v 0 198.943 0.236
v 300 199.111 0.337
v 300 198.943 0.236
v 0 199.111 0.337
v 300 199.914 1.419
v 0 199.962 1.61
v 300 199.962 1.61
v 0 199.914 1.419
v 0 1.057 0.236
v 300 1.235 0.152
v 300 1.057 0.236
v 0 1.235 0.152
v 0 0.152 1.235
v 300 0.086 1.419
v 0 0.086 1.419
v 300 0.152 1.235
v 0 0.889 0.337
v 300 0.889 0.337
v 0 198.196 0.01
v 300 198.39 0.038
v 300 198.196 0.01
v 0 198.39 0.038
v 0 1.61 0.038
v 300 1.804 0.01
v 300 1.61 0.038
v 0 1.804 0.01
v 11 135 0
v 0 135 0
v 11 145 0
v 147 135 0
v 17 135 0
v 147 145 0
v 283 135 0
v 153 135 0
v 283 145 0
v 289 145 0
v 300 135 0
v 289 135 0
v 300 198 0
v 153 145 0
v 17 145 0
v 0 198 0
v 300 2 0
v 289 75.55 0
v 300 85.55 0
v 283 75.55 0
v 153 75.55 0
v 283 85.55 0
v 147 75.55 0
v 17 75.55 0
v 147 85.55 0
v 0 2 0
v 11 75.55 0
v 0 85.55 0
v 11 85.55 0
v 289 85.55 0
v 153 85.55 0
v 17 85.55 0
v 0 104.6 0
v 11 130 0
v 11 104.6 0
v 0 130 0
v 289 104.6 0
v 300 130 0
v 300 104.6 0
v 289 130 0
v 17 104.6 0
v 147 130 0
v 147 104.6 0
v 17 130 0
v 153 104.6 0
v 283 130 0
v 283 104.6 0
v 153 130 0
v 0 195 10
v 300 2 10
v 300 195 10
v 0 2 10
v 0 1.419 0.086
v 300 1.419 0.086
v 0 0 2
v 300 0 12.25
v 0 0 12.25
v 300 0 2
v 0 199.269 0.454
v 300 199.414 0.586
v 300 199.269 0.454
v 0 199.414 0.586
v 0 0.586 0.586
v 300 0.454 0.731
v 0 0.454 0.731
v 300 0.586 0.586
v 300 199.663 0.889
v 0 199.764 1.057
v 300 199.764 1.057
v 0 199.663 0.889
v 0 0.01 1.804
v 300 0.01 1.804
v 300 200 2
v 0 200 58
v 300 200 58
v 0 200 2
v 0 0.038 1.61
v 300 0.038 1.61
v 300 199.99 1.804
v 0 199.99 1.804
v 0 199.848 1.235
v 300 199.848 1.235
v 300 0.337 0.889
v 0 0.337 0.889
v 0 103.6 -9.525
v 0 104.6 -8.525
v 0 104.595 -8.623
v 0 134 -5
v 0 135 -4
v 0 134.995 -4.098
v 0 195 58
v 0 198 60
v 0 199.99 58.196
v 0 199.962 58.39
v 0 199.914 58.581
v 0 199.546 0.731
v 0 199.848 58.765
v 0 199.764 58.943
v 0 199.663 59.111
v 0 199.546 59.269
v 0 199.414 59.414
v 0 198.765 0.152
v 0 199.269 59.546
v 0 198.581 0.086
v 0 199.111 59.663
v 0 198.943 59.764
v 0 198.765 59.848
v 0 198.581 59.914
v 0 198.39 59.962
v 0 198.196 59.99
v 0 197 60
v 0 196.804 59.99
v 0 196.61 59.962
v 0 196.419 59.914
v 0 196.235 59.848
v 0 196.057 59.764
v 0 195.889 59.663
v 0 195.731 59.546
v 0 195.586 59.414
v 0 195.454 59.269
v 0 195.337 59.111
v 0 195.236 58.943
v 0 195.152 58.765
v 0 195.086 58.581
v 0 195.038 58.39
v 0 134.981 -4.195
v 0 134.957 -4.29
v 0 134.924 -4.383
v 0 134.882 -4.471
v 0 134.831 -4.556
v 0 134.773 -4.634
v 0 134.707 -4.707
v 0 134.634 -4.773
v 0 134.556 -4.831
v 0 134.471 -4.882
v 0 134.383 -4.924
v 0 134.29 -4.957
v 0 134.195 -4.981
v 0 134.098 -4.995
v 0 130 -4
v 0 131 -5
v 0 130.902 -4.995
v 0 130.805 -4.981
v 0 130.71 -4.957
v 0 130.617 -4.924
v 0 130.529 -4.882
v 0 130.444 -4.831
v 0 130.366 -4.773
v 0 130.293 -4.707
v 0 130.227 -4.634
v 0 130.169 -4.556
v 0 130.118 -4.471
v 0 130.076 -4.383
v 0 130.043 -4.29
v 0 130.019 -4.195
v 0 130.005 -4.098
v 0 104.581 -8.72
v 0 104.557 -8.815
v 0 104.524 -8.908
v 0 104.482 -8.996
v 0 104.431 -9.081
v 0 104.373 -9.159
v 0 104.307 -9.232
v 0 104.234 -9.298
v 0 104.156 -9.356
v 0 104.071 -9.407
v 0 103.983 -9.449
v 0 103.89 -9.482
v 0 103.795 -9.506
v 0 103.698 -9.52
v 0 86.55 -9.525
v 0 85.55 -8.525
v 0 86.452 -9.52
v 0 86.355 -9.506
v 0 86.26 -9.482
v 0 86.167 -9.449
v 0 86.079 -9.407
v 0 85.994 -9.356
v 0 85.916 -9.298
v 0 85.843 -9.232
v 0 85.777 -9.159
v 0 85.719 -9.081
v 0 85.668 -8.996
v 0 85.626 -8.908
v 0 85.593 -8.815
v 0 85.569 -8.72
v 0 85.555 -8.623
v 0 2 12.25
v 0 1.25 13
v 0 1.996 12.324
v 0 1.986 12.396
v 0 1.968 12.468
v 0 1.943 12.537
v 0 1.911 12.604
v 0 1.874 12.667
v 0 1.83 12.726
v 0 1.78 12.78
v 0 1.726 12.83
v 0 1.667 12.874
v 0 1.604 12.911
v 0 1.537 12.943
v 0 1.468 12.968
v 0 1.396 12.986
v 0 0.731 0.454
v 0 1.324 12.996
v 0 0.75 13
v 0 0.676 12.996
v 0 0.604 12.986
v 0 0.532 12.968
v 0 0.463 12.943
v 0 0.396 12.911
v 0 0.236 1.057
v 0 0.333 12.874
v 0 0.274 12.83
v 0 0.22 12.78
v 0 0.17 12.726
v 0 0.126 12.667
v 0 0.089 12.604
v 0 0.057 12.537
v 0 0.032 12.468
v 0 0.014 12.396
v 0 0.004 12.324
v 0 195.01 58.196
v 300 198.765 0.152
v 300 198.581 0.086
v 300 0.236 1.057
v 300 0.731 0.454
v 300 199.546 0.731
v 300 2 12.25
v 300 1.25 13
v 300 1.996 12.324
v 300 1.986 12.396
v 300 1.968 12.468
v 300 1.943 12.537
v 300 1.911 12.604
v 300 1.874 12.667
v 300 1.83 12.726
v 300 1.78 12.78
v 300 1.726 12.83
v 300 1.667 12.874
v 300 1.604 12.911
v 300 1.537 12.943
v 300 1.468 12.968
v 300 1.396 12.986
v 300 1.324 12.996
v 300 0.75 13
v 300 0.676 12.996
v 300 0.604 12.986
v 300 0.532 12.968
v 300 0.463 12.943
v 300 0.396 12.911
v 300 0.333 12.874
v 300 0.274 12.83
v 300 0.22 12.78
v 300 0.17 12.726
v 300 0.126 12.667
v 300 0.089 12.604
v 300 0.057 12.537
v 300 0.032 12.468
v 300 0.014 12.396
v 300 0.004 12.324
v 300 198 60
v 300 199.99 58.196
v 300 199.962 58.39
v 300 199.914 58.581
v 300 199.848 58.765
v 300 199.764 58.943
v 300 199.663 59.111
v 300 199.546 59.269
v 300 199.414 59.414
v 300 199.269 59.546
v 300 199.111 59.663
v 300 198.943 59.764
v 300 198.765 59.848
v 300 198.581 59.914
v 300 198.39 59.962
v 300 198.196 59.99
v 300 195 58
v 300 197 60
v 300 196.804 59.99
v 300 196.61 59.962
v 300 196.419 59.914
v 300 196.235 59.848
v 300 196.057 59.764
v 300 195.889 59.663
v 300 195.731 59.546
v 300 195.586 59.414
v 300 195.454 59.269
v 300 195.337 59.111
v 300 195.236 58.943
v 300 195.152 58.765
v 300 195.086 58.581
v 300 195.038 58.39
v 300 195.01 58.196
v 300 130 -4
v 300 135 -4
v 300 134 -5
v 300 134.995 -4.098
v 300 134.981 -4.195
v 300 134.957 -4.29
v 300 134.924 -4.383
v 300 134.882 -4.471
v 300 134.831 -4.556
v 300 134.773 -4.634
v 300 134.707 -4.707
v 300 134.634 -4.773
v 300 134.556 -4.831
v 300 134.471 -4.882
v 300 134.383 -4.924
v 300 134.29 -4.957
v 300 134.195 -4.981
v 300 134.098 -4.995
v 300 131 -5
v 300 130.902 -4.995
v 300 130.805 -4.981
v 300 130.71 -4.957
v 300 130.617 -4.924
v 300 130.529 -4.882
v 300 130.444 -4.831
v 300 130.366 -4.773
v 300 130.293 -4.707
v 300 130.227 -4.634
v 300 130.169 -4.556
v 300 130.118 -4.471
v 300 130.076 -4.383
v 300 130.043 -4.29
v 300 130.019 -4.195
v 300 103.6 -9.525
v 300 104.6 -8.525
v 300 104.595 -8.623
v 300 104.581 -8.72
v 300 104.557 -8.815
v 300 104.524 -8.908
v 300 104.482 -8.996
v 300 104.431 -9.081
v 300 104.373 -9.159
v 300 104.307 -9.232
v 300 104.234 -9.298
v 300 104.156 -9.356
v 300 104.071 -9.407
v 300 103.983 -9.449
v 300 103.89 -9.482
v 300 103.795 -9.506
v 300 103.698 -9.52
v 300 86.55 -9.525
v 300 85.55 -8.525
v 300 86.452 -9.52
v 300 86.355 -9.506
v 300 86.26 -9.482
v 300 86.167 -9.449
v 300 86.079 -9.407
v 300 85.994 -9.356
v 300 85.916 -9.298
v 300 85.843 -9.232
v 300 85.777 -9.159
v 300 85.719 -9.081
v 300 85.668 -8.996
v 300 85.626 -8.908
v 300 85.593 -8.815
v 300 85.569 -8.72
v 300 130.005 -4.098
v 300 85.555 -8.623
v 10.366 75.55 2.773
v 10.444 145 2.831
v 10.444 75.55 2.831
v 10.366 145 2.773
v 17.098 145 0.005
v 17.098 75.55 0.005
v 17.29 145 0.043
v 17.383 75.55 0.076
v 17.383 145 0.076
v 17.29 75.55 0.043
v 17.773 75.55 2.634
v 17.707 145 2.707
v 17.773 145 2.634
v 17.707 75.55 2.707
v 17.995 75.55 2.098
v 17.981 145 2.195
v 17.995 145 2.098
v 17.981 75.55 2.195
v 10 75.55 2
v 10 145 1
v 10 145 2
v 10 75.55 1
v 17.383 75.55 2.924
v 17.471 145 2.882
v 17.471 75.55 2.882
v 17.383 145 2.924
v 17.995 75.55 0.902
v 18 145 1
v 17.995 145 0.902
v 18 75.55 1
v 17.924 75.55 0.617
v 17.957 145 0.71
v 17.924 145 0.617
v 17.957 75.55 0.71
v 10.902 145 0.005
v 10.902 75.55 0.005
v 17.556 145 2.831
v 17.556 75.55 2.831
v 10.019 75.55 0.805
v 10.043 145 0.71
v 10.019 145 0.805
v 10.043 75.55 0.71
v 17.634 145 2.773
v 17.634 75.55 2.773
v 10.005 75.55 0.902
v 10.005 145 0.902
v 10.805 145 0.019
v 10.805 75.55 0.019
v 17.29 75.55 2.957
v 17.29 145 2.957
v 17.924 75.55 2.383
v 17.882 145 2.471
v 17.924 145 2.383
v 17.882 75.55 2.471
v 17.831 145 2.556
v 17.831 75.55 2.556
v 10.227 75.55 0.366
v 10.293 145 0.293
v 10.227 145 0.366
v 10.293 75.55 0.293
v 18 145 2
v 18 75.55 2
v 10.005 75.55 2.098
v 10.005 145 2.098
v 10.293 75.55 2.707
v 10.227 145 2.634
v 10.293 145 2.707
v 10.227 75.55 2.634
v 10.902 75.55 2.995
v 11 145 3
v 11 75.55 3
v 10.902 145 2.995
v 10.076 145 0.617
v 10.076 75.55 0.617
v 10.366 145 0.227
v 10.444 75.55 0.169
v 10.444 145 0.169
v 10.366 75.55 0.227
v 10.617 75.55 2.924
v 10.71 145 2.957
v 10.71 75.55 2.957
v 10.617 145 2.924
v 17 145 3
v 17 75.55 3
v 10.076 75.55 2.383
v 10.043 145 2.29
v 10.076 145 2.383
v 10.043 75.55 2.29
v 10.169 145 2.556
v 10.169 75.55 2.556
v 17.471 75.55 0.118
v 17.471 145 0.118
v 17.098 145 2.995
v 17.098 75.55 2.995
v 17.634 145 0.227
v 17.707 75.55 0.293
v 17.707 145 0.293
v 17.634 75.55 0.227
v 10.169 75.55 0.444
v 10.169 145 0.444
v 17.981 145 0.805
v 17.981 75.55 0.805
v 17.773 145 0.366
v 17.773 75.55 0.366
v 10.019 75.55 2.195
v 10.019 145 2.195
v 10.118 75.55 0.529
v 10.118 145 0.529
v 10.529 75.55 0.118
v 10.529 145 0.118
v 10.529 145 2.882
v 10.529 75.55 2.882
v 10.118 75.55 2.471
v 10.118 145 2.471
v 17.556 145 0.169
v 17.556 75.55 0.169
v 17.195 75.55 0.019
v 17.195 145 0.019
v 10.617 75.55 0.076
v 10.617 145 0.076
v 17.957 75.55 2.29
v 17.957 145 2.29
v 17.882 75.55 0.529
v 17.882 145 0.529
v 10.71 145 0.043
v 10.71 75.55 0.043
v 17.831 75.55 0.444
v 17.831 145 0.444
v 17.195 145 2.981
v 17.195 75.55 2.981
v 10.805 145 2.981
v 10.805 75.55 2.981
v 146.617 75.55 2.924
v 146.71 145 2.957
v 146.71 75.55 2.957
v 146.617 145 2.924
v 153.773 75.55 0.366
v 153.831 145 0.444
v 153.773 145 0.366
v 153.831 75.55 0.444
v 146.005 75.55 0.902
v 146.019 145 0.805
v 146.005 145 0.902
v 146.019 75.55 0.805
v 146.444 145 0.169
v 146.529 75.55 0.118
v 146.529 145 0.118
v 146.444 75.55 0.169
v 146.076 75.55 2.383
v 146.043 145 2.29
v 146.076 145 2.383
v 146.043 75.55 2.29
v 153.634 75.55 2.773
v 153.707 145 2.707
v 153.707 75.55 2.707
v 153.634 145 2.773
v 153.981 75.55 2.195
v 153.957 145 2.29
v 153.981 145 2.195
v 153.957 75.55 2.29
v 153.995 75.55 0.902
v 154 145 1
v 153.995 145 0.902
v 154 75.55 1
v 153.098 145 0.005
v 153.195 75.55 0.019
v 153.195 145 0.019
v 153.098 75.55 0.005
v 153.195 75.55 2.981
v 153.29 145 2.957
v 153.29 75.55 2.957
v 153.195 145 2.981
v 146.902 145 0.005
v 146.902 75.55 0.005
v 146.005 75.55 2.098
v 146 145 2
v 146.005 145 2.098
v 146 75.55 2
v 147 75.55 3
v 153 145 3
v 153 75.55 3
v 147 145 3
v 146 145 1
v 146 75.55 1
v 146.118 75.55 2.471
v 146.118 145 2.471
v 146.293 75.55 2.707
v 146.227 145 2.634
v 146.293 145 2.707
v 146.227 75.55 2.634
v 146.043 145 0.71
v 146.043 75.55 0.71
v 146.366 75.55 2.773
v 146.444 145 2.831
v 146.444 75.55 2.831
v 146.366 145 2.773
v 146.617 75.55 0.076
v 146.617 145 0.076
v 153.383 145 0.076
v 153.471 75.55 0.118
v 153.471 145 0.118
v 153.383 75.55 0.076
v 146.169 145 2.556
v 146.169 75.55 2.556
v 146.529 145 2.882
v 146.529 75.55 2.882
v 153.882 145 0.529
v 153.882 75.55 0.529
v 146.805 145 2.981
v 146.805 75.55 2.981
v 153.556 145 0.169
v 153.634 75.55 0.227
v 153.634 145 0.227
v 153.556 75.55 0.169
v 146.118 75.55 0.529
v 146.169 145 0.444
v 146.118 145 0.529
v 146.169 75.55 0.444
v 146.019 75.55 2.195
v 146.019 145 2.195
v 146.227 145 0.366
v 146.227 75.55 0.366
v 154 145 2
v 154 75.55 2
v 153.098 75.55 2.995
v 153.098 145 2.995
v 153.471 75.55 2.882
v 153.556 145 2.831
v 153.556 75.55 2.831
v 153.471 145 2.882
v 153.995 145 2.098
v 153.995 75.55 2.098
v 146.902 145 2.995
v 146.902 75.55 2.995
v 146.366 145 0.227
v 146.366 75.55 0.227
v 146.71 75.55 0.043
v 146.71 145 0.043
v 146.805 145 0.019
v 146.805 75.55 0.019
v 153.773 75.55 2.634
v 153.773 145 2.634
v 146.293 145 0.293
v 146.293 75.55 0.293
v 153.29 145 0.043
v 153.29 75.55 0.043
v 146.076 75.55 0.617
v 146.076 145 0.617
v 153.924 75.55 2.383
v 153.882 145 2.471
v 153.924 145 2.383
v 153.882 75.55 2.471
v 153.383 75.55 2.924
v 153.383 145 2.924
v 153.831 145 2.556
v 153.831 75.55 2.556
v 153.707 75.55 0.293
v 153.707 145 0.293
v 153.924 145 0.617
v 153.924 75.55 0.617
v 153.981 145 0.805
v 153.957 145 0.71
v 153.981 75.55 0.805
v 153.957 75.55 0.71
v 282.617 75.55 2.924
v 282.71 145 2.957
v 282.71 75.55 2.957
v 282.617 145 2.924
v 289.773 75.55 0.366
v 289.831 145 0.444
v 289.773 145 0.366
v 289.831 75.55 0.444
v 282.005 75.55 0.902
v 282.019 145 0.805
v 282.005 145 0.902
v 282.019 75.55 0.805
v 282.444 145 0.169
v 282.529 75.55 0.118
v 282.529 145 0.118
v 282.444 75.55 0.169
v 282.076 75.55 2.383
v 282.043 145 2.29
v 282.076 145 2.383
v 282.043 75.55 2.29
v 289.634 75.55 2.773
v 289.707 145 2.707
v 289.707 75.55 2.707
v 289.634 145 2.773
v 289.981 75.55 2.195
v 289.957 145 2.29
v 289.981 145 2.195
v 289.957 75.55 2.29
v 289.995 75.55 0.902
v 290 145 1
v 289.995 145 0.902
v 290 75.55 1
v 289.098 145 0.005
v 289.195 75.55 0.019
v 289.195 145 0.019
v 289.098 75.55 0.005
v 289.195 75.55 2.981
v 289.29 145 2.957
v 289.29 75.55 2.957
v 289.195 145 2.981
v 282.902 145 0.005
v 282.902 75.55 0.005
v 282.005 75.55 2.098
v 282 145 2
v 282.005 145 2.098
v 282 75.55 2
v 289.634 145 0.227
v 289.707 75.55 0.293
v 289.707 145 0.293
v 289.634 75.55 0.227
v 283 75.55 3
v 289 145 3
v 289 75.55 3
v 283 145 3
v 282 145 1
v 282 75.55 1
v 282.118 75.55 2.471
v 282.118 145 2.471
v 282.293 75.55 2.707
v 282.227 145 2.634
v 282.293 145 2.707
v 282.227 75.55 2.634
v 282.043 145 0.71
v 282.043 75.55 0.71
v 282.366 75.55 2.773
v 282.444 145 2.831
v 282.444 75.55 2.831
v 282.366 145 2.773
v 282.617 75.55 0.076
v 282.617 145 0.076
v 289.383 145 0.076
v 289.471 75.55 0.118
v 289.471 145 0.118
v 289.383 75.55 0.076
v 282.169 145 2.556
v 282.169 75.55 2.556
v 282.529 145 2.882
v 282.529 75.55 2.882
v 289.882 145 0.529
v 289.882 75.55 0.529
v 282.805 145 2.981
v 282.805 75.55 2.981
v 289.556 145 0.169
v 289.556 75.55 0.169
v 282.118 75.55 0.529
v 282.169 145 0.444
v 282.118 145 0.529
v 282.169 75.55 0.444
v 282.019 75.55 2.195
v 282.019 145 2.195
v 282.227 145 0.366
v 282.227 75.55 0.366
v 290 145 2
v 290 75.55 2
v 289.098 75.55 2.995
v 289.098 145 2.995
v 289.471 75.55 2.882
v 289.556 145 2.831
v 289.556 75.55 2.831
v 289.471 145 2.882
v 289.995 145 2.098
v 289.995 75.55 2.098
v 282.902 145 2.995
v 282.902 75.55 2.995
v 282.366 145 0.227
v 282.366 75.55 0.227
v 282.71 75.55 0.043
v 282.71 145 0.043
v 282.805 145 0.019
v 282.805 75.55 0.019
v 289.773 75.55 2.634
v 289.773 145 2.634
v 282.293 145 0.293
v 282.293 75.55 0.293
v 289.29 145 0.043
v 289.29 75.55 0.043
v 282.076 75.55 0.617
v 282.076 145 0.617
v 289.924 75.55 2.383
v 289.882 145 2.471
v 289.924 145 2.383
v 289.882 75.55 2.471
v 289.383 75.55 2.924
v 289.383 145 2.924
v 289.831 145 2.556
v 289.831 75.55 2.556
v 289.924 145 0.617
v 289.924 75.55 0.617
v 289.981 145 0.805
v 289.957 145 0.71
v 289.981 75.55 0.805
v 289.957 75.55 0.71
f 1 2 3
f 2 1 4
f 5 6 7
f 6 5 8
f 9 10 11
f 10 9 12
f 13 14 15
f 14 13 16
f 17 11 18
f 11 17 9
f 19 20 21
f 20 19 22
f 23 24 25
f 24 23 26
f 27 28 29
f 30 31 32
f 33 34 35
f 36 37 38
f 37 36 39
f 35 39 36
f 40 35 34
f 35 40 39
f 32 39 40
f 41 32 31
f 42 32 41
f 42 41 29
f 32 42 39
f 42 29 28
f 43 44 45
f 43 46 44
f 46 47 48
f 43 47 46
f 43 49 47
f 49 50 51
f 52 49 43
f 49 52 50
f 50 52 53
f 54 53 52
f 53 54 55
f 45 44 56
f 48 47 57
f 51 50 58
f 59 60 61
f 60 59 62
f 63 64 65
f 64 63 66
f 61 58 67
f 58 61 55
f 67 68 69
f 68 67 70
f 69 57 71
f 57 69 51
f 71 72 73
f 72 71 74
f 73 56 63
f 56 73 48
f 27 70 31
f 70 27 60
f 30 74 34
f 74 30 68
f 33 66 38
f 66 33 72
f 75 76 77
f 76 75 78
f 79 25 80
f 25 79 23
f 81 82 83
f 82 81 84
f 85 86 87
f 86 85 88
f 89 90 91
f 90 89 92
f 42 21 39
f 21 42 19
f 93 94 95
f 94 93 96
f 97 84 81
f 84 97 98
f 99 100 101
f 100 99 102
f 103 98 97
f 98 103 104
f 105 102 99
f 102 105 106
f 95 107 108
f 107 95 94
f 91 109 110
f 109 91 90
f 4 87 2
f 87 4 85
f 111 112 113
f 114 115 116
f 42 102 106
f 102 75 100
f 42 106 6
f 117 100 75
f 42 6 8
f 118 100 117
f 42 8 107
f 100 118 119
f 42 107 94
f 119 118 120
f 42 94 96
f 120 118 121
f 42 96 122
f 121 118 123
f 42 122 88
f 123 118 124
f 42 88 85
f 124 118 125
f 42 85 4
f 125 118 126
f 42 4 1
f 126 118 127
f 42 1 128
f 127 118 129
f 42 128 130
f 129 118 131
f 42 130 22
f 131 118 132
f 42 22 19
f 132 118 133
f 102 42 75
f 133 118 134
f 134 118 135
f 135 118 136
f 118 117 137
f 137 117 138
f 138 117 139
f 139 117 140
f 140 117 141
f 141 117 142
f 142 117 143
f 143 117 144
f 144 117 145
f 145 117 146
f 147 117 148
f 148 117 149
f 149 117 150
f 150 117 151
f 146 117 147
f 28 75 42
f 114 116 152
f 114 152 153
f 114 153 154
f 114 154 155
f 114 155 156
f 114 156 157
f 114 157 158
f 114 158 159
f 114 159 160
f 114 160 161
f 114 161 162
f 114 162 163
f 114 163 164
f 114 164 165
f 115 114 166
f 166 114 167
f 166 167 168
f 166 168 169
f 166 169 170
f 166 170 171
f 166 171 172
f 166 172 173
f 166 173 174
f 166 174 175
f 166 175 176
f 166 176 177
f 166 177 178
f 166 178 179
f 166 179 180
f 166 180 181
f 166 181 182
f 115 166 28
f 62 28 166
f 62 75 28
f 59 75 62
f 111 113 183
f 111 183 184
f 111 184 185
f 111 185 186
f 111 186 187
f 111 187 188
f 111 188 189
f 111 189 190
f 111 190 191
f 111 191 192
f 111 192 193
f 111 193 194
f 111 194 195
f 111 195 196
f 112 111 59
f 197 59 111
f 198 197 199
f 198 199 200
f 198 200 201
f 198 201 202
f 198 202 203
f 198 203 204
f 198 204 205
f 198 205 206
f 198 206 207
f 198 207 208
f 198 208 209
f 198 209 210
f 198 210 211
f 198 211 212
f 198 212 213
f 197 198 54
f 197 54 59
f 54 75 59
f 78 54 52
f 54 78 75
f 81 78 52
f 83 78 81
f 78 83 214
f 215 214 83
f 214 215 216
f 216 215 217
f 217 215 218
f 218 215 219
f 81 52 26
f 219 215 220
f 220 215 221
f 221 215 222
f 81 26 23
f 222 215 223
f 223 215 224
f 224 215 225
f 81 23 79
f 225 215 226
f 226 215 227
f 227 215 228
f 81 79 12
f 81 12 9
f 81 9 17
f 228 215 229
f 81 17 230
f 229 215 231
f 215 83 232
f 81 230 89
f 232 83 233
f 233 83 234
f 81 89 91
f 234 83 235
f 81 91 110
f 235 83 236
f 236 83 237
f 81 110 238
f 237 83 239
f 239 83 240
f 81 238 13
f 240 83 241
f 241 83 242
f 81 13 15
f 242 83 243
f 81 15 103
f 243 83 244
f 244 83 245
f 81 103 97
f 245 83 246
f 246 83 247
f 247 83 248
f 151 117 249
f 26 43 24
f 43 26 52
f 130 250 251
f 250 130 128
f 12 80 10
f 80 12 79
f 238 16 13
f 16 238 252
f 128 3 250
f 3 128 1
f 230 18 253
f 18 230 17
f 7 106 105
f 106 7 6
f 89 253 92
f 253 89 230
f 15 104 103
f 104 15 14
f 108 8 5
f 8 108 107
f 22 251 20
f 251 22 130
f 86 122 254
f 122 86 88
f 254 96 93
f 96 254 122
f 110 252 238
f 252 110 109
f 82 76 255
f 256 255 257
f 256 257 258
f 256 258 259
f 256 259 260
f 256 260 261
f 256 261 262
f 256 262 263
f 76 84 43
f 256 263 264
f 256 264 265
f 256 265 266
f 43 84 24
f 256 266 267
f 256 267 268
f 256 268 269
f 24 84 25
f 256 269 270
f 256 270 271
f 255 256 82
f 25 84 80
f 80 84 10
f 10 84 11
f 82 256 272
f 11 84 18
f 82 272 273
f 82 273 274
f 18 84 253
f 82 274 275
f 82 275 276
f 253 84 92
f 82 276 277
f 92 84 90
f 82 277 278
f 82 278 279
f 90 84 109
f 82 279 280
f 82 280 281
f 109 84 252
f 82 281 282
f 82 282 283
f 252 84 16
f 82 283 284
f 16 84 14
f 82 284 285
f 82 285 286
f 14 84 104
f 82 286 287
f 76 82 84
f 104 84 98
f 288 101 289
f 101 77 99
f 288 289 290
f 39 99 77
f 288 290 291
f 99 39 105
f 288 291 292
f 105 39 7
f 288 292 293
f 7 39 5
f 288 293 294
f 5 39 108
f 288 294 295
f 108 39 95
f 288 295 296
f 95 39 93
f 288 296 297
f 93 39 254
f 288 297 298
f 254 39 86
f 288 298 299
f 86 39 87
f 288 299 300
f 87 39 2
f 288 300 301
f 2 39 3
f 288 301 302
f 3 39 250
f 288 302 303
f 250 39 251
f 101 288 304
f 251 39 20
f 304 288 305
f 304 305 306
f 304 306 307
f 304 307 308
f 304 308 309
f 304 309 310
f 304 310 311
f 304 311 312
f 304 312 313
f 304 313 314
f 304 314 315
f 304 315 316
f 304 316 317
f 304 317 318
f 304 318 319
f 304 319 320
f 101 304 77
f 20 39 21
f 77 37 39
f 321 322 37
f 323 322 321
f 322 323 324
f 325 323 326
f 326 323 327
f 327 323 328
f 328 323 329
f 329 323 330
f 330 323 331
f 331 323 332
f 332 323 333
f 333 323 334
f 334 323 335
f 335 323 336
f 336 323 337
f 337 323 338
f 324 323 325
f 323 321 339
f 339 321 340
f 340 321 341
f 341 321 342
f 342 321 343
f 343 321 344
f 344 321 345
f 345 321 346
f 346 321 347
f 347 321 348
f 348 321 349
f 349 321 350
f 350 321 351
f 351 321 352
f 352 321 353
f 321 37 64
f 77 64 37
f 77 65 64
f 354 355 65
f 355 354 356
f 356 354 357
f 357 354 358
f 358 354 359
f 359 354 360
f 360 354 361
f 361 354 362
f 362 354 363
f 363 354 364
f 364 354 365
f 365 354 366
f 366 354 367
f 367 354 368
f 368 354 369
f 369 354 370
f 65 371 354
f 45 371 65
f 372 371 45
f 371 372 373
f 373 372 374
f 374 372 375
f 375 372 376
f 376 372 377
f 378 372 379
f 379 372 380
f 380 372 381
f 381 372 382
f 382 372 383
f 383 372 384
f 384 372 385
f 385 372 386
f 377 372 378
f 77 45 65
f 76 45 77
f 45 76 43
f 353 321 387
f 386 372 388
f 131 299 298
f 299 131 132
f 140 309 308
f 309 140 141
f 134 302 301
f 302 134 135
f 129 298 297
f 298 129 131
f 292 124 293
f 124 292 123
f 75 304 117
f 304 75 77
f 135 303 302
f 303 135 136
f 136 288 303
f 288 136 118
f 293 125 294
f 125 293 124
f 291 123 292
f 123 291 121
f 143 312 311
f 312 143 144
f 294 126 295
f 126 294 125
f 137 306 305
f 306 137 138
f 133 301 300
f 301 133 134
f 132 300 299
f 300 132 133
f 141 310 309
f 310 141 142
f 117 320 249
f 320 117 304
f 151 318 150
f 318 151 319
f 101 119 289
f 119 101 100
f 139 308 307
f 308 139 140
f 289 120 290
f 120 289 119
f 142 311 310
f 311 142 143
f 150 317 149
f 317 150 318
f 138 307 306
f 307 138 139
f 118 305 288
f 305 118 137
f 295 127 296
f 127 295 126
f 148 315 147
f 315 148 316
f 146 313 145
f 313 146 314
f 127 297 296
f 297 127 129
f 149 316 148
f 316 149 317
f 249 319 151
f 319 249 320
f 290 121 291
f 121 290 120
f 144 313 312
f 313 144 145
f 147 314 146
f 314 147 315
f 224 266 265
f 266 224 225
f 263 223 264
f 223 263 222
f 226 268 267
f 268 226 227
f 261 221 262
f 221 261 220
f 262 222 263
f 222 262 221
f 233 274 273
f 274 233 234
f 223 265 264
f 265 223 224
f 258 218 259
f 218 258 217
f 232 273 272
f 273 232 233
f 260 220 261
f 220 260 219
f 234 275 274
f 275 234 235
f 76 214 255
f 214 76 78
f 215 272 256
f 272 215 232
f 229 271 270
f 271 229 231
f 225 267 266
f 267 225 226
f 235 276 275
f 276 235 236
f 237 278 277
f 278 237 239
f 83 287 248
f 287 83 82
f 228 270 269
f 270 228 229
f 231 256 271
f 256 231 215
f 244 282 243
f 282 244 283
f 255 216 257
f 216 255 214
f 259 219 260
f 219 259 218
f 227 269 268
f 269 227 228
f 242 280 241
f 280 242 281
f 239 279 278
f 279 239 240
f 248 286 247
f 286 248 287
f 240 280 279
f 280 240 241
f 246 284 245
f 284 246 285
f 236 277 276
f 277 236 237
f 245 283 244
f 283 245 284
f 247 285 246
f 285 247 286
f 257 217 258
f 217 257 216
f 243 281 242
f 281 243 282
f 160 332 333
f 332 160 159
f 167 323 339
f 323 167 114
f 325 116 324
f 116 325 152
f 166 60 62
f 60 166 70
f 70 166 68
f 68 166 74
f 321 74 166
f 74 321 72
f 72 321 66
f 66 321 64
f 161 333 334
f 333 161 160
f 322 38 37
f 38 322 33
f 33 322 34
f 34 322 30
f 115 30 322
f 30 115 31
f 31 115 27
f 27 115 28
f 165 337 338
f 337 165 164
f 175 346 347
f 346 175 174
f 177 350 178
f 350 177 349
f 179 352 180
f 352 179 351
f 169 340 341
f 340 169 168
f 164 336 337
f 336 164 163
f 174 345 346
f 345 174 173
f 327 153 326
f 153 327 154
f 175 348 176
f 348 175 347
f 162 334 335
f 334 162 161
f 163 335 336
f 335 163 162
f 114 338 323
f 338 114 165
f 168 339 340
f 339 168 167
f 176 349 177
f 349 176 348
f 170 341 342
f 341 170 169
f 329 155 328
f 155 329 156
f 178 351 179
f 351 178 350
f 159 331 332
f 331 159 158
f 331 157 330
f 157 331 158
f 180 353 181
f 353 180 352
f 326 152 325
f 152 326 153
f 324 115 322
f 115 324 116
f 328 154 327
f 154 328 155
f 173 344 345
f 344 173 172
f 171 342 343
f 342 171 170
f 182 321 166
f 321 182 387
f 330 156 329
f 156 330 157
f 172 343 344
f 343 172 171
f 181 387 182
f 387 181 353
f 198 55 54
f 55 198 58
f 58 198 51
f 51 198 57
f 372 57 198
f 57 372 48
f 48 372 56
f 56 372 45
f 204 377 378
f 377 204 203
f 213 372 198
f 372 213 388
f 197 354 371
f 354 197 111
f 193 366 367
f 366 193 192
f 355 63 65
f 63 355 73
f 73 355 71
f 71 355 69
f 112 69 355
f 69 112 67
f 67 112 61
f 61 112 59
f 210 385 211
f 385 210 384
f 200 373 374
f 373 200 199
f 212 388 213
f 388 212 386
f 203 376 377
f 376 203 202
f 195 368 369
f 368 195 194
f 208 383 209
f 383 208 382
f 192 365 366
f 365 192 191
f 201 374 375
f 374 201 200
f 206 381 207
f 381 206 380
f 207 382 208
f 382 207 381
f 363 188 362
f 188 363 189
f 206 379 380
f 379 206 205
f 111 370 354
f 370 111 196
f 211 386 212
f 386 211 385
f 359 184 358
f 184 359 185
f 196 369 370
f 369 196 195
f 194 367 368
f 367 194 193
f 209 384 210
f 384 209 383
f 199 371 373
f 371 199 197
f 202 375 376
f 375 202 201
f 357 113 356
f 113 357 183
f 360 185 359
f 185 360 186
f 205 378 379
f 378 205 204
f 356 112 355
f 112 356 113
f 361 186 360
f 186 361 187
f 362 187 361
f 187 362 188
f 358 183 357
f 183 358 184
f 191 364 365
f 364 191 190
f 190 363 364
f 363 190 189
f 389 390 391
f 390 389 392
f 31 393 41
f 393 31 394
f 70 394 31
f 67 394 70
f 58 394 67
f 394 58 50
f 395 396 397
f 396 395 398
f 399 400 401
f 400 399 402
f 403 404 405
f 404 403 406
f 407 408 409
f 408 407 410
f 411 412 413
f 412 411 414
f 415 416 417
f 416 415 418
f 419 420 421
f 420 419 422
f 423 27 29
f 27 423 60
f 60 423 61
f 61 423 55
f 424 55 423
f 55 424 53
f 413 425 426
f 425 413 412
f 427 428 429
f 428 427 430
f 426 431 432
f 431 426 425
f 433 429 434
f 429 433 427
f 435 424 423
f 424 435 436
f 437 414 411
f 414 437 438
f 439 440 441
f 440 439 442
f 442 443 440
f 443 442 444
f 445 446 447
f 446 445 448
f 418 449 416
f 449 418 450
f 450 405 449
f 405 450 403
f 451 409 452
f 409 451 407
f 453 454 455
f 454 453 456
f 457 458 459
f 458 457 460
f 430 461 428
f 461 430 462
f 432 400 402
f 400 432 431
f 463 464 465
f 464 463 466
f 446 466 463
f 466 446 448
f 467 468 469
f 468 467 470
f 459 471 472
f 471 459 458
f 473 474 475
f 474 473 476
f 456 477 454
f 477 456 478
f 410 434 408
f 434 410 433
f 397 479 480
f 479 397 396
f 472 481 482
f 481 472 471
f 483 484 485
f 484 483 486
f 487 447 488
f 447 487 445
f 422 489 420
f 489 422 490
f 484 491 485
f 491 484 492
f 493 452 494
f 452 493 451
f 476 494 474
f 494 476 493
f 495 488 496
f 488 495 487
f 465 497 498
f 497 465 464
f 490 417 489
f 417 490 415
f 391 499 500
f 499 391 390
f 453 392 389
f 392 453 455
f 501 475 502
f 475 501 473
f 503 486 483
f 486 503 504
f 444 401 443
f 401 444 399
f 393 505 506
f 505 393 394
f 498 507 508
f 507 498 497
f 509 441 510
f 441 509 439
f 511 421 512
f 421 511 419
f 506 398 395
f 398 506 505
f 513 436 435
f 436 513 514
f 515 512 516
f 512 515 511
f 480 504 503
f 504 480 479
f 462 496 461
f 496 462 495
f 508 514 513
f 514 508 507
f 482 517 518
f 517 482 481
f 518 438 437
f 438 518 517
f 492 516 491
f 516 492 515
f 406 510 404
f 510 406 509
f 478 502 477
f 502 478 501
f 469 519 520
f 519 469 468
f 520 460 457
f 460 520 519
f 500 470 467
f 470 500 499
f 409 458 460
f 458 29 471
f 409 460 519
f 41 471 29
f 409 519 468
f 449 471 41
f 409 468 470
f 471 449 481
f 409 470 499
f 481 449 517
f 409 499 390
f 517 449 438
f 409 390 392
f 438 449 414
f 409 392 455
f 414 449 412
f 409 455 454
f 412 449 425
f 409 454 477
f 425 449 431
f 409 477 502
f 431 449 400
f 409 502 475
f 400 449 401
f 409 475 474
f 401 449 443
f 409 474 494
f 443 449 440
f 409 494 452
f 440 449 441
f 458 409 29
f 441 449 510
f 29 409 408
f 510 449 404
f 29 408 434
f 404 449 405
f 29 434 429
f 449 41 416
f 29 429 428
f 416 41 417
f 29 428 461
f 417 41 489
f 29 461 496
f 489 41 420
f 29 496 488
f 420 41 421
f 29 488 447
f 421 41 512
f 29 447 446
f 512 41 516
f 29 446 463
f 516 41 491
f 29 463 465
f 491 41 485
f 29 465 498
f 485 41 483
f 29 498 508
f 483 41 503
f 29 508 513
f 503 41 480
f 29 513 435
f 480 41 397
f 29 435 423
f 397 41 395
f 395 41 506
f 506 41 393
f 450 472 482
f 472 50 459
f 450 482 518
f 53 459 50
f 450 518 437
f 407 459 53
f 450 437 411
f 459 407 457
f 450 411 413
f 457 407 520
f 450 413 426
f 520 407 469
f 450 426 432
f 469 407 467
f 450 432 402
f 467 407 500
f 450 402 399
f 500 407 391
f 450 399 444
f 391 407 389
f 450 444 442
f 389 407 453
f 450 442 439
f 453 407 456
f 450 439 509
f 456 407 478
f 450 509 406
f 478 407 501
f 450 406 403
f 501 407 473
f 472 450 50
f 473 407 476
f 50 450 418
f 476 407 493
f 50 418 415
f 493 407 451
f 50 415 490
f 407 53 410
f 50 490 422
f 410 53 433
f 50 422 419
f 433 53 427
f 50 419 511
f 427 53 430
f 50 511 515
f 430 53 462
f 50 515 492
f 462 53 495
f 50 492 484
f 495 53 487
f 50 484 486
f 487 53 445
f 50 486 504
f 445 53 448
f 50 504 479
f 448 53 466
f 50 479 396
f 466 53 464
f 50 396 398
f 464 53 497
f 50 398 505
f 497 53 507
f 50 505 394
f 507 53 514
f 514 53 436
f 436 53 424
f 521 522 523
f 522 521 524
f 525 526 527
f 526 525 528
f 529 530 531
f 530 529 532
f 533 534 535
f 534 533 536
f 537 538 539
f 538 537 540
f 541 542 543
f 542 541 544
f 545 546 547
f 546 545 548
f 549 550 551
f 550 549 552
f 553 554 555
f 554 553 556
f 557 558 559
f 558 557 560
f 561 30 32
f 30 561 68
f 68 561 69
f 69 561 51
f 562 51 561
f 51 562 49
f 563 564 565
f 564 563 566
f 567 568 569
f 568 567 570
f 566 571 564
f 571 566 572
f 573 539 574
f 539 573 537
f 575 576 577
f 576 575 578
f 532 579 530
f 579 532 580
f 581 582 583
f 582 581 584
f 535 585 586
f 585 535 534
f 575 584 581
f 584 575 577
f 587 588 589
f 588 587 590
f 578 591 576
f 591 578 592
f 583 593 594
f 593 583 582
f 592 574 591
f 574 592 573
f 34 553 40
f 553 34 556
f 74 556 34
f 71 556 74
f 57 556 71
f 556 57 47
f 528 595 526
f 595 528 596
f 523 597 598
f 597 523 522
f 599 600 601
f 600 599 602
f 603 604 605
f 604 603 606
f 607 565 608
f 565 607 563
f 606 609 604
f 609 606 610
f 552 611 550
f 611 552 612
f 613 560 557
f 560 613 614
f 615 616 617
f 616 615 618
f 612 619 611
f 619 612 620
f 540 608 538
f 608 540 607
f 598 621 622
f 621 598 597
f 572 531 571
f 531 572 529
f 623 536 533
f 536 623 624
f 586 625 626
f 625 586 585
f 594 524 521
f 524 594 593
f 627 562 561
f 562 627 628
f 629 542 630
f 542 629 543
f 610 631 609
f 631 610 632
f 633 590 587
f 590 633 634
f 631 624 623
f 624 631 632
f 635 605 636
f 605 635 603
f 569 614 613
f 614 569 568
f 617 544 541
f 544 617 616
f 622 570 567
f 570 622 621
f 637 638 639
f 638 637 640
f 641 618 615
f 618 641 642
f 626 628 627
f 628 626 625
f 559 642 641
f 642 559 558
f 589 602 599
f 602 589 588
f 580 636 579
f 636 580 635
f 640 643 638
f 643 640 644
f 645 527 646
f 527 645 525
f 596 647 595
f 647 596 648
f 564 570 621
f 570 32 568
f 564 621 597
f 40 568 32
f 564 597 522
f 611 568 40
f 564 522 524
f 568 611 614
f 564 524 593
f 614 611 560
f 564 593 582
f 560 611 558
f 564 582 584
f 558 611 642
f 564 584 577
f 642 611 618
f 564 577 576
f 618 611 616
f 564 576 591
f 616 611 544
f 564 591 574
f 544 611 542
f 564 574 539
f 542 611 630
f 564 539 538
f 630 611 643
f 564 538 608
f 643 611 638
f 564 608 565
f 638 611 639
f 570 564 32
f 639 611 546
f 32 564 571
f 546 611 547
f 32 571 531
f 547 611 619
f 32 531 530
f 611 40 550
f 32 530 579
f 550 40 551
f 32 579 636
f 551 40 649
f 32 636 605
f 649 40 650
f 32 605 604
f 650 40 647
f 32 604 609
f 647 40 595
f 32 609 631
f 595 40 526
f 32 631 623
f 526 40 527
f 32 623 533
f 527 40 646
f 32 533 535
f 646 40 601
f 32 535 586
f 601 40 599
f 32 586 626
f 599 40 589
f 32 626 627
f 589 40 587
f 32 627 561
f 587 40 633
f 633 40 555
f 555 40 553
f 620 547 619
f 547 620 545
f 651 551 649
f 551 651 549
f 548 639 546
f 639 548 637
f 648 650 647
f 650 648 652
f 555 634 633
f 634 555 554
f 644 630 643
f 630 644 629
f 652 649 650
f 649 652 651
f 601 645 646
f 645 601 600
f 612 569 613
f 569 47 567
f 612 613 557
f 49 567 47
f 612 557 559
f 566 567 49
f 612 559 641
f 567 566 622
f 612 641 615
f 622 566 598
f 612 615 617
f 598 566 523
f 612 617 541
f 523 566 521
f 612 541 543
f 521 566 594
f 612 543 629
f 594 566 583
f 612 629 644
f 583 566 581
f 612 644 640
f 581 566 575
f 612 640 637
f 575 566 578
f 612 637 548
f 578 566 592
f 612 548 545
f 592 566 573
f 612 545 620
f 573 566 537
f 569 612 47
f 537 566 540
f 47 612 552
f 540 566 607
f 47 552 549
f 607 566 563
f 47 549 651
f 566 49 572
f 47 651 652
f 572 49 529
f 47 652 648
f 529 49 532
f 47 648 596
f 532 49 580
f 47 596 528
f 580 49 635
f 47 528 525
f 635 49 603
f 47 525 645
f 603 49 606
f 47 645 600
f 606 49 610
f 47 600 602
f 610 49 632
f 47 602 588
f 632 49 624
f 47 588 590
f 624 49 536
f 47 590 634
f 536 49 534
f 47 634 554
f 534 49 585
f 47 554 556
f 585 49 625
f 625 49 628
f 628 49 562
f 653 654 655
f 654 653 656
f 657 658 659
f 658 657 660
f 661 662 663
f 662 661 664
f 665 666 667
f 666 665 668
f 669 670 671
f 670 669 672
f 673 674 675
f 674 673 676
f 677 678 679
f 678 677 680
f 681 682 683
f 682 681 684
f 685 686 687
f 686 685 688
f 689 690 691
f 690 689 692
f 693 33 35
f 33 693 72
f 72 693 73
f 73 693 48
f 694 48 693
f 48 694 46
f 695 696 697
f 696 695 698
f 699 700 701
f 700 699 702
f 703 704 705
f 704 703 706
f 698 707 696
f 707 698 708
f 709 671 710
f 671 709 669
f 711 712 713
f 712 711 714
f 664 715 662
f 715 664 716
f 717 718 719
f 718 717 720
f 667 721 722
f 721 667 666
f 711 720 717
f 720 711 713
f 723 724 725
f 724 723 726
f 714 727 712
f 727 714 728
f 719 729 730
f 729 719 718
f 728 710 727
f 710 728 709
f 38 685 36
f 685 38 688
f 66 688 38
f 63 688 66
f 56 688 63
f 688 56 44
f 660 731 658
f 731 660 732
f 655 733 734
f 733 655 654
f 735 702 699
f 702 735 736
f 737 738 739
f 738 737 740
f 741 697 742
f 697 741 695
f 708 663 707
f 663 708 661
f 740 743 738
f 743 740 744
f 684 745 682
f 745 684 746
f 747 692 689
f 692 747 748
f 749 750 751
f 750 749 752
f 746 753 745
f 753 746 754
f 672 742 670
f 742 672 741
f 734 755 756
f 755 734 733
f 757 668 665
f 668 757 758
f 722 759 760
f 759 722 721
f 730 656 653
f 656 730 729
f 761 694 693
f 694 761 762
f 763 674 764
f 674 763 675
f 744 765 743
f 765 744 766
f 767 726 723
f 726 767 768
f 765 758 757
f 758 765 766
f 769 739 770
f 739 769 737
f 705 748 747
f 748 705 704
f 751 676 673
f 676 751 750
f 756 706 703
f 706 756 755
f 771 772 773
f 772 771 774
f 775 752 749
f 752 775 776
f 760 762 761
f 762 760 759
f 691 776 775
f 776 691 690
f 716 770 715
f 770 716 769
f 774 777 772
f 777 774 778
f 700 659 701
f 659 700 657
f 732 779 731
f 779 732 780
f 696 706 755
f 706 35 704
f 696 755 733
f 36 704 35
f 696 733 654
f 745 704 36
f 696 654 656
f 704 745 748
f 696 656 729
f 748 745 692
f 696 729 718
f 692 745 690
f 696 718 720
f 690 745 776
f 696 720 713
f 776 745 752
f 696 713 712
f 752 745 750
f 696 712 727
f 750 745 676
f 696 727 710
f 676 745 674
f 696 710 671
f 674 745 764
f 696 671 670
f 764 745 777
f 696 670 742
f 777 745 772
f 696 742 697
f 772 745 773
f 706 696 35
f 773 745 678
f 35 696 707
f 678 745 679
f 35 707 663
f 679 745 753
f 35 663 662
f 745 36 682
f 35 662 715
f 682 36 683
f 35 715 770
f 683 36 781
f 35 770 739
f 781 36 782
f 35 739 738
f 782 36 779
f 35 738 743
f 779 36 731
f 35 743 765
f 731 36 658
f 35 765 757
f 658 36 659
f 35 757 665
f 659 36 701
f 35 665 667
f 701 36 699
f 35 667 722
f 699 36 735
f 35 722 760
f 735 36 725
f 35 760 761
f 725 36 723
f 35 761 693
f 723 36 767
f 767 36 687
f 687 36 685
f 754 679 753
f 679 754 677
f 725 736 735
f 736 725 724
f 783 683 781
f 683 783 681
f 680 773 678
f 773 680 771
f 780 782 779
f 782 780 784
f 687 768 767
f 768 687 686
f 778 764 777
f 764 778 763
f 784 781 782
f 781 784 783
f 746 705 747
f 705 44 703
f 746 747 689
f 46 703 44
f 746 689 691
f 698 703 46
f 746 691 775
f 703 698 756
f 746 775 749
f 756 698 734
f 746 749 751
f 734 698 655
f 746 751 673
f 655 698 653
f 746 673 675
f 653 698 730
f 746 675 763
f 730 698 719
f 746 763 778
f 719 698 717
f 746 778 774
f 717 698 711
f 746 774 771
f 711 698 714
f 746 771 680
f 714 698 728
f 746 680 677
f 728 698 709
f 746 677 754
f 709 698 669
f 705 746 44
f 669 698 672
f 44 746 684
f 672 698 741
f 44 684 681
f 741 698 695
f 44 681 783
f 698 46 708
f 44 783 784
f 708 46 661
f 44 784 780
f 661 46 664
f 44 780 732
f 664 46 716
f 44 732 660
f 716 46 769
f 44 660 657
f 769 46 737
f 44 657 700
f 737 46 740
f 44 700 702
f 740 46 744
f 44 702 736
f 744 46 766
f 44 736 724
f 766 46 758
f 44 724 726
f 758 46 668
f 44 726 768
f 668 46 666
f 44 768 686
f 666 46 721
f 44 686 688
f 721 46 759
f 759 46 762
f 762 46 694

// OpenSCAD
// file: 72-inch-cosco-profile.scad
// 72-inch Cosco shelf profile.
//
// Overrides the bar / front-lip dimensions in bar_shelf.scad to fit a
// 72-inch Cosco shelving rail. Include this BEFORE bar_shelf.scad in any
// wrapper that should use the Cosco profile.
border_ridge_override     = 25.4;    // 1"
border_depth_override     = 19.05;   // 3/4"
border_height_override    = 9.525;   // 3/8"
rear_wall_height_override = 5;       // shorter rear lip than 77-inch industrial
// main file
// 300mm-wide x 200mm-deep 72-inch Cosco shelf — see bar_shelf.scad for the design.
include <72-inch-cosco-profile.scad>
shelf_width_override = 300;
shelf_depth_override = 200;
include <bar_shelf.scad>
